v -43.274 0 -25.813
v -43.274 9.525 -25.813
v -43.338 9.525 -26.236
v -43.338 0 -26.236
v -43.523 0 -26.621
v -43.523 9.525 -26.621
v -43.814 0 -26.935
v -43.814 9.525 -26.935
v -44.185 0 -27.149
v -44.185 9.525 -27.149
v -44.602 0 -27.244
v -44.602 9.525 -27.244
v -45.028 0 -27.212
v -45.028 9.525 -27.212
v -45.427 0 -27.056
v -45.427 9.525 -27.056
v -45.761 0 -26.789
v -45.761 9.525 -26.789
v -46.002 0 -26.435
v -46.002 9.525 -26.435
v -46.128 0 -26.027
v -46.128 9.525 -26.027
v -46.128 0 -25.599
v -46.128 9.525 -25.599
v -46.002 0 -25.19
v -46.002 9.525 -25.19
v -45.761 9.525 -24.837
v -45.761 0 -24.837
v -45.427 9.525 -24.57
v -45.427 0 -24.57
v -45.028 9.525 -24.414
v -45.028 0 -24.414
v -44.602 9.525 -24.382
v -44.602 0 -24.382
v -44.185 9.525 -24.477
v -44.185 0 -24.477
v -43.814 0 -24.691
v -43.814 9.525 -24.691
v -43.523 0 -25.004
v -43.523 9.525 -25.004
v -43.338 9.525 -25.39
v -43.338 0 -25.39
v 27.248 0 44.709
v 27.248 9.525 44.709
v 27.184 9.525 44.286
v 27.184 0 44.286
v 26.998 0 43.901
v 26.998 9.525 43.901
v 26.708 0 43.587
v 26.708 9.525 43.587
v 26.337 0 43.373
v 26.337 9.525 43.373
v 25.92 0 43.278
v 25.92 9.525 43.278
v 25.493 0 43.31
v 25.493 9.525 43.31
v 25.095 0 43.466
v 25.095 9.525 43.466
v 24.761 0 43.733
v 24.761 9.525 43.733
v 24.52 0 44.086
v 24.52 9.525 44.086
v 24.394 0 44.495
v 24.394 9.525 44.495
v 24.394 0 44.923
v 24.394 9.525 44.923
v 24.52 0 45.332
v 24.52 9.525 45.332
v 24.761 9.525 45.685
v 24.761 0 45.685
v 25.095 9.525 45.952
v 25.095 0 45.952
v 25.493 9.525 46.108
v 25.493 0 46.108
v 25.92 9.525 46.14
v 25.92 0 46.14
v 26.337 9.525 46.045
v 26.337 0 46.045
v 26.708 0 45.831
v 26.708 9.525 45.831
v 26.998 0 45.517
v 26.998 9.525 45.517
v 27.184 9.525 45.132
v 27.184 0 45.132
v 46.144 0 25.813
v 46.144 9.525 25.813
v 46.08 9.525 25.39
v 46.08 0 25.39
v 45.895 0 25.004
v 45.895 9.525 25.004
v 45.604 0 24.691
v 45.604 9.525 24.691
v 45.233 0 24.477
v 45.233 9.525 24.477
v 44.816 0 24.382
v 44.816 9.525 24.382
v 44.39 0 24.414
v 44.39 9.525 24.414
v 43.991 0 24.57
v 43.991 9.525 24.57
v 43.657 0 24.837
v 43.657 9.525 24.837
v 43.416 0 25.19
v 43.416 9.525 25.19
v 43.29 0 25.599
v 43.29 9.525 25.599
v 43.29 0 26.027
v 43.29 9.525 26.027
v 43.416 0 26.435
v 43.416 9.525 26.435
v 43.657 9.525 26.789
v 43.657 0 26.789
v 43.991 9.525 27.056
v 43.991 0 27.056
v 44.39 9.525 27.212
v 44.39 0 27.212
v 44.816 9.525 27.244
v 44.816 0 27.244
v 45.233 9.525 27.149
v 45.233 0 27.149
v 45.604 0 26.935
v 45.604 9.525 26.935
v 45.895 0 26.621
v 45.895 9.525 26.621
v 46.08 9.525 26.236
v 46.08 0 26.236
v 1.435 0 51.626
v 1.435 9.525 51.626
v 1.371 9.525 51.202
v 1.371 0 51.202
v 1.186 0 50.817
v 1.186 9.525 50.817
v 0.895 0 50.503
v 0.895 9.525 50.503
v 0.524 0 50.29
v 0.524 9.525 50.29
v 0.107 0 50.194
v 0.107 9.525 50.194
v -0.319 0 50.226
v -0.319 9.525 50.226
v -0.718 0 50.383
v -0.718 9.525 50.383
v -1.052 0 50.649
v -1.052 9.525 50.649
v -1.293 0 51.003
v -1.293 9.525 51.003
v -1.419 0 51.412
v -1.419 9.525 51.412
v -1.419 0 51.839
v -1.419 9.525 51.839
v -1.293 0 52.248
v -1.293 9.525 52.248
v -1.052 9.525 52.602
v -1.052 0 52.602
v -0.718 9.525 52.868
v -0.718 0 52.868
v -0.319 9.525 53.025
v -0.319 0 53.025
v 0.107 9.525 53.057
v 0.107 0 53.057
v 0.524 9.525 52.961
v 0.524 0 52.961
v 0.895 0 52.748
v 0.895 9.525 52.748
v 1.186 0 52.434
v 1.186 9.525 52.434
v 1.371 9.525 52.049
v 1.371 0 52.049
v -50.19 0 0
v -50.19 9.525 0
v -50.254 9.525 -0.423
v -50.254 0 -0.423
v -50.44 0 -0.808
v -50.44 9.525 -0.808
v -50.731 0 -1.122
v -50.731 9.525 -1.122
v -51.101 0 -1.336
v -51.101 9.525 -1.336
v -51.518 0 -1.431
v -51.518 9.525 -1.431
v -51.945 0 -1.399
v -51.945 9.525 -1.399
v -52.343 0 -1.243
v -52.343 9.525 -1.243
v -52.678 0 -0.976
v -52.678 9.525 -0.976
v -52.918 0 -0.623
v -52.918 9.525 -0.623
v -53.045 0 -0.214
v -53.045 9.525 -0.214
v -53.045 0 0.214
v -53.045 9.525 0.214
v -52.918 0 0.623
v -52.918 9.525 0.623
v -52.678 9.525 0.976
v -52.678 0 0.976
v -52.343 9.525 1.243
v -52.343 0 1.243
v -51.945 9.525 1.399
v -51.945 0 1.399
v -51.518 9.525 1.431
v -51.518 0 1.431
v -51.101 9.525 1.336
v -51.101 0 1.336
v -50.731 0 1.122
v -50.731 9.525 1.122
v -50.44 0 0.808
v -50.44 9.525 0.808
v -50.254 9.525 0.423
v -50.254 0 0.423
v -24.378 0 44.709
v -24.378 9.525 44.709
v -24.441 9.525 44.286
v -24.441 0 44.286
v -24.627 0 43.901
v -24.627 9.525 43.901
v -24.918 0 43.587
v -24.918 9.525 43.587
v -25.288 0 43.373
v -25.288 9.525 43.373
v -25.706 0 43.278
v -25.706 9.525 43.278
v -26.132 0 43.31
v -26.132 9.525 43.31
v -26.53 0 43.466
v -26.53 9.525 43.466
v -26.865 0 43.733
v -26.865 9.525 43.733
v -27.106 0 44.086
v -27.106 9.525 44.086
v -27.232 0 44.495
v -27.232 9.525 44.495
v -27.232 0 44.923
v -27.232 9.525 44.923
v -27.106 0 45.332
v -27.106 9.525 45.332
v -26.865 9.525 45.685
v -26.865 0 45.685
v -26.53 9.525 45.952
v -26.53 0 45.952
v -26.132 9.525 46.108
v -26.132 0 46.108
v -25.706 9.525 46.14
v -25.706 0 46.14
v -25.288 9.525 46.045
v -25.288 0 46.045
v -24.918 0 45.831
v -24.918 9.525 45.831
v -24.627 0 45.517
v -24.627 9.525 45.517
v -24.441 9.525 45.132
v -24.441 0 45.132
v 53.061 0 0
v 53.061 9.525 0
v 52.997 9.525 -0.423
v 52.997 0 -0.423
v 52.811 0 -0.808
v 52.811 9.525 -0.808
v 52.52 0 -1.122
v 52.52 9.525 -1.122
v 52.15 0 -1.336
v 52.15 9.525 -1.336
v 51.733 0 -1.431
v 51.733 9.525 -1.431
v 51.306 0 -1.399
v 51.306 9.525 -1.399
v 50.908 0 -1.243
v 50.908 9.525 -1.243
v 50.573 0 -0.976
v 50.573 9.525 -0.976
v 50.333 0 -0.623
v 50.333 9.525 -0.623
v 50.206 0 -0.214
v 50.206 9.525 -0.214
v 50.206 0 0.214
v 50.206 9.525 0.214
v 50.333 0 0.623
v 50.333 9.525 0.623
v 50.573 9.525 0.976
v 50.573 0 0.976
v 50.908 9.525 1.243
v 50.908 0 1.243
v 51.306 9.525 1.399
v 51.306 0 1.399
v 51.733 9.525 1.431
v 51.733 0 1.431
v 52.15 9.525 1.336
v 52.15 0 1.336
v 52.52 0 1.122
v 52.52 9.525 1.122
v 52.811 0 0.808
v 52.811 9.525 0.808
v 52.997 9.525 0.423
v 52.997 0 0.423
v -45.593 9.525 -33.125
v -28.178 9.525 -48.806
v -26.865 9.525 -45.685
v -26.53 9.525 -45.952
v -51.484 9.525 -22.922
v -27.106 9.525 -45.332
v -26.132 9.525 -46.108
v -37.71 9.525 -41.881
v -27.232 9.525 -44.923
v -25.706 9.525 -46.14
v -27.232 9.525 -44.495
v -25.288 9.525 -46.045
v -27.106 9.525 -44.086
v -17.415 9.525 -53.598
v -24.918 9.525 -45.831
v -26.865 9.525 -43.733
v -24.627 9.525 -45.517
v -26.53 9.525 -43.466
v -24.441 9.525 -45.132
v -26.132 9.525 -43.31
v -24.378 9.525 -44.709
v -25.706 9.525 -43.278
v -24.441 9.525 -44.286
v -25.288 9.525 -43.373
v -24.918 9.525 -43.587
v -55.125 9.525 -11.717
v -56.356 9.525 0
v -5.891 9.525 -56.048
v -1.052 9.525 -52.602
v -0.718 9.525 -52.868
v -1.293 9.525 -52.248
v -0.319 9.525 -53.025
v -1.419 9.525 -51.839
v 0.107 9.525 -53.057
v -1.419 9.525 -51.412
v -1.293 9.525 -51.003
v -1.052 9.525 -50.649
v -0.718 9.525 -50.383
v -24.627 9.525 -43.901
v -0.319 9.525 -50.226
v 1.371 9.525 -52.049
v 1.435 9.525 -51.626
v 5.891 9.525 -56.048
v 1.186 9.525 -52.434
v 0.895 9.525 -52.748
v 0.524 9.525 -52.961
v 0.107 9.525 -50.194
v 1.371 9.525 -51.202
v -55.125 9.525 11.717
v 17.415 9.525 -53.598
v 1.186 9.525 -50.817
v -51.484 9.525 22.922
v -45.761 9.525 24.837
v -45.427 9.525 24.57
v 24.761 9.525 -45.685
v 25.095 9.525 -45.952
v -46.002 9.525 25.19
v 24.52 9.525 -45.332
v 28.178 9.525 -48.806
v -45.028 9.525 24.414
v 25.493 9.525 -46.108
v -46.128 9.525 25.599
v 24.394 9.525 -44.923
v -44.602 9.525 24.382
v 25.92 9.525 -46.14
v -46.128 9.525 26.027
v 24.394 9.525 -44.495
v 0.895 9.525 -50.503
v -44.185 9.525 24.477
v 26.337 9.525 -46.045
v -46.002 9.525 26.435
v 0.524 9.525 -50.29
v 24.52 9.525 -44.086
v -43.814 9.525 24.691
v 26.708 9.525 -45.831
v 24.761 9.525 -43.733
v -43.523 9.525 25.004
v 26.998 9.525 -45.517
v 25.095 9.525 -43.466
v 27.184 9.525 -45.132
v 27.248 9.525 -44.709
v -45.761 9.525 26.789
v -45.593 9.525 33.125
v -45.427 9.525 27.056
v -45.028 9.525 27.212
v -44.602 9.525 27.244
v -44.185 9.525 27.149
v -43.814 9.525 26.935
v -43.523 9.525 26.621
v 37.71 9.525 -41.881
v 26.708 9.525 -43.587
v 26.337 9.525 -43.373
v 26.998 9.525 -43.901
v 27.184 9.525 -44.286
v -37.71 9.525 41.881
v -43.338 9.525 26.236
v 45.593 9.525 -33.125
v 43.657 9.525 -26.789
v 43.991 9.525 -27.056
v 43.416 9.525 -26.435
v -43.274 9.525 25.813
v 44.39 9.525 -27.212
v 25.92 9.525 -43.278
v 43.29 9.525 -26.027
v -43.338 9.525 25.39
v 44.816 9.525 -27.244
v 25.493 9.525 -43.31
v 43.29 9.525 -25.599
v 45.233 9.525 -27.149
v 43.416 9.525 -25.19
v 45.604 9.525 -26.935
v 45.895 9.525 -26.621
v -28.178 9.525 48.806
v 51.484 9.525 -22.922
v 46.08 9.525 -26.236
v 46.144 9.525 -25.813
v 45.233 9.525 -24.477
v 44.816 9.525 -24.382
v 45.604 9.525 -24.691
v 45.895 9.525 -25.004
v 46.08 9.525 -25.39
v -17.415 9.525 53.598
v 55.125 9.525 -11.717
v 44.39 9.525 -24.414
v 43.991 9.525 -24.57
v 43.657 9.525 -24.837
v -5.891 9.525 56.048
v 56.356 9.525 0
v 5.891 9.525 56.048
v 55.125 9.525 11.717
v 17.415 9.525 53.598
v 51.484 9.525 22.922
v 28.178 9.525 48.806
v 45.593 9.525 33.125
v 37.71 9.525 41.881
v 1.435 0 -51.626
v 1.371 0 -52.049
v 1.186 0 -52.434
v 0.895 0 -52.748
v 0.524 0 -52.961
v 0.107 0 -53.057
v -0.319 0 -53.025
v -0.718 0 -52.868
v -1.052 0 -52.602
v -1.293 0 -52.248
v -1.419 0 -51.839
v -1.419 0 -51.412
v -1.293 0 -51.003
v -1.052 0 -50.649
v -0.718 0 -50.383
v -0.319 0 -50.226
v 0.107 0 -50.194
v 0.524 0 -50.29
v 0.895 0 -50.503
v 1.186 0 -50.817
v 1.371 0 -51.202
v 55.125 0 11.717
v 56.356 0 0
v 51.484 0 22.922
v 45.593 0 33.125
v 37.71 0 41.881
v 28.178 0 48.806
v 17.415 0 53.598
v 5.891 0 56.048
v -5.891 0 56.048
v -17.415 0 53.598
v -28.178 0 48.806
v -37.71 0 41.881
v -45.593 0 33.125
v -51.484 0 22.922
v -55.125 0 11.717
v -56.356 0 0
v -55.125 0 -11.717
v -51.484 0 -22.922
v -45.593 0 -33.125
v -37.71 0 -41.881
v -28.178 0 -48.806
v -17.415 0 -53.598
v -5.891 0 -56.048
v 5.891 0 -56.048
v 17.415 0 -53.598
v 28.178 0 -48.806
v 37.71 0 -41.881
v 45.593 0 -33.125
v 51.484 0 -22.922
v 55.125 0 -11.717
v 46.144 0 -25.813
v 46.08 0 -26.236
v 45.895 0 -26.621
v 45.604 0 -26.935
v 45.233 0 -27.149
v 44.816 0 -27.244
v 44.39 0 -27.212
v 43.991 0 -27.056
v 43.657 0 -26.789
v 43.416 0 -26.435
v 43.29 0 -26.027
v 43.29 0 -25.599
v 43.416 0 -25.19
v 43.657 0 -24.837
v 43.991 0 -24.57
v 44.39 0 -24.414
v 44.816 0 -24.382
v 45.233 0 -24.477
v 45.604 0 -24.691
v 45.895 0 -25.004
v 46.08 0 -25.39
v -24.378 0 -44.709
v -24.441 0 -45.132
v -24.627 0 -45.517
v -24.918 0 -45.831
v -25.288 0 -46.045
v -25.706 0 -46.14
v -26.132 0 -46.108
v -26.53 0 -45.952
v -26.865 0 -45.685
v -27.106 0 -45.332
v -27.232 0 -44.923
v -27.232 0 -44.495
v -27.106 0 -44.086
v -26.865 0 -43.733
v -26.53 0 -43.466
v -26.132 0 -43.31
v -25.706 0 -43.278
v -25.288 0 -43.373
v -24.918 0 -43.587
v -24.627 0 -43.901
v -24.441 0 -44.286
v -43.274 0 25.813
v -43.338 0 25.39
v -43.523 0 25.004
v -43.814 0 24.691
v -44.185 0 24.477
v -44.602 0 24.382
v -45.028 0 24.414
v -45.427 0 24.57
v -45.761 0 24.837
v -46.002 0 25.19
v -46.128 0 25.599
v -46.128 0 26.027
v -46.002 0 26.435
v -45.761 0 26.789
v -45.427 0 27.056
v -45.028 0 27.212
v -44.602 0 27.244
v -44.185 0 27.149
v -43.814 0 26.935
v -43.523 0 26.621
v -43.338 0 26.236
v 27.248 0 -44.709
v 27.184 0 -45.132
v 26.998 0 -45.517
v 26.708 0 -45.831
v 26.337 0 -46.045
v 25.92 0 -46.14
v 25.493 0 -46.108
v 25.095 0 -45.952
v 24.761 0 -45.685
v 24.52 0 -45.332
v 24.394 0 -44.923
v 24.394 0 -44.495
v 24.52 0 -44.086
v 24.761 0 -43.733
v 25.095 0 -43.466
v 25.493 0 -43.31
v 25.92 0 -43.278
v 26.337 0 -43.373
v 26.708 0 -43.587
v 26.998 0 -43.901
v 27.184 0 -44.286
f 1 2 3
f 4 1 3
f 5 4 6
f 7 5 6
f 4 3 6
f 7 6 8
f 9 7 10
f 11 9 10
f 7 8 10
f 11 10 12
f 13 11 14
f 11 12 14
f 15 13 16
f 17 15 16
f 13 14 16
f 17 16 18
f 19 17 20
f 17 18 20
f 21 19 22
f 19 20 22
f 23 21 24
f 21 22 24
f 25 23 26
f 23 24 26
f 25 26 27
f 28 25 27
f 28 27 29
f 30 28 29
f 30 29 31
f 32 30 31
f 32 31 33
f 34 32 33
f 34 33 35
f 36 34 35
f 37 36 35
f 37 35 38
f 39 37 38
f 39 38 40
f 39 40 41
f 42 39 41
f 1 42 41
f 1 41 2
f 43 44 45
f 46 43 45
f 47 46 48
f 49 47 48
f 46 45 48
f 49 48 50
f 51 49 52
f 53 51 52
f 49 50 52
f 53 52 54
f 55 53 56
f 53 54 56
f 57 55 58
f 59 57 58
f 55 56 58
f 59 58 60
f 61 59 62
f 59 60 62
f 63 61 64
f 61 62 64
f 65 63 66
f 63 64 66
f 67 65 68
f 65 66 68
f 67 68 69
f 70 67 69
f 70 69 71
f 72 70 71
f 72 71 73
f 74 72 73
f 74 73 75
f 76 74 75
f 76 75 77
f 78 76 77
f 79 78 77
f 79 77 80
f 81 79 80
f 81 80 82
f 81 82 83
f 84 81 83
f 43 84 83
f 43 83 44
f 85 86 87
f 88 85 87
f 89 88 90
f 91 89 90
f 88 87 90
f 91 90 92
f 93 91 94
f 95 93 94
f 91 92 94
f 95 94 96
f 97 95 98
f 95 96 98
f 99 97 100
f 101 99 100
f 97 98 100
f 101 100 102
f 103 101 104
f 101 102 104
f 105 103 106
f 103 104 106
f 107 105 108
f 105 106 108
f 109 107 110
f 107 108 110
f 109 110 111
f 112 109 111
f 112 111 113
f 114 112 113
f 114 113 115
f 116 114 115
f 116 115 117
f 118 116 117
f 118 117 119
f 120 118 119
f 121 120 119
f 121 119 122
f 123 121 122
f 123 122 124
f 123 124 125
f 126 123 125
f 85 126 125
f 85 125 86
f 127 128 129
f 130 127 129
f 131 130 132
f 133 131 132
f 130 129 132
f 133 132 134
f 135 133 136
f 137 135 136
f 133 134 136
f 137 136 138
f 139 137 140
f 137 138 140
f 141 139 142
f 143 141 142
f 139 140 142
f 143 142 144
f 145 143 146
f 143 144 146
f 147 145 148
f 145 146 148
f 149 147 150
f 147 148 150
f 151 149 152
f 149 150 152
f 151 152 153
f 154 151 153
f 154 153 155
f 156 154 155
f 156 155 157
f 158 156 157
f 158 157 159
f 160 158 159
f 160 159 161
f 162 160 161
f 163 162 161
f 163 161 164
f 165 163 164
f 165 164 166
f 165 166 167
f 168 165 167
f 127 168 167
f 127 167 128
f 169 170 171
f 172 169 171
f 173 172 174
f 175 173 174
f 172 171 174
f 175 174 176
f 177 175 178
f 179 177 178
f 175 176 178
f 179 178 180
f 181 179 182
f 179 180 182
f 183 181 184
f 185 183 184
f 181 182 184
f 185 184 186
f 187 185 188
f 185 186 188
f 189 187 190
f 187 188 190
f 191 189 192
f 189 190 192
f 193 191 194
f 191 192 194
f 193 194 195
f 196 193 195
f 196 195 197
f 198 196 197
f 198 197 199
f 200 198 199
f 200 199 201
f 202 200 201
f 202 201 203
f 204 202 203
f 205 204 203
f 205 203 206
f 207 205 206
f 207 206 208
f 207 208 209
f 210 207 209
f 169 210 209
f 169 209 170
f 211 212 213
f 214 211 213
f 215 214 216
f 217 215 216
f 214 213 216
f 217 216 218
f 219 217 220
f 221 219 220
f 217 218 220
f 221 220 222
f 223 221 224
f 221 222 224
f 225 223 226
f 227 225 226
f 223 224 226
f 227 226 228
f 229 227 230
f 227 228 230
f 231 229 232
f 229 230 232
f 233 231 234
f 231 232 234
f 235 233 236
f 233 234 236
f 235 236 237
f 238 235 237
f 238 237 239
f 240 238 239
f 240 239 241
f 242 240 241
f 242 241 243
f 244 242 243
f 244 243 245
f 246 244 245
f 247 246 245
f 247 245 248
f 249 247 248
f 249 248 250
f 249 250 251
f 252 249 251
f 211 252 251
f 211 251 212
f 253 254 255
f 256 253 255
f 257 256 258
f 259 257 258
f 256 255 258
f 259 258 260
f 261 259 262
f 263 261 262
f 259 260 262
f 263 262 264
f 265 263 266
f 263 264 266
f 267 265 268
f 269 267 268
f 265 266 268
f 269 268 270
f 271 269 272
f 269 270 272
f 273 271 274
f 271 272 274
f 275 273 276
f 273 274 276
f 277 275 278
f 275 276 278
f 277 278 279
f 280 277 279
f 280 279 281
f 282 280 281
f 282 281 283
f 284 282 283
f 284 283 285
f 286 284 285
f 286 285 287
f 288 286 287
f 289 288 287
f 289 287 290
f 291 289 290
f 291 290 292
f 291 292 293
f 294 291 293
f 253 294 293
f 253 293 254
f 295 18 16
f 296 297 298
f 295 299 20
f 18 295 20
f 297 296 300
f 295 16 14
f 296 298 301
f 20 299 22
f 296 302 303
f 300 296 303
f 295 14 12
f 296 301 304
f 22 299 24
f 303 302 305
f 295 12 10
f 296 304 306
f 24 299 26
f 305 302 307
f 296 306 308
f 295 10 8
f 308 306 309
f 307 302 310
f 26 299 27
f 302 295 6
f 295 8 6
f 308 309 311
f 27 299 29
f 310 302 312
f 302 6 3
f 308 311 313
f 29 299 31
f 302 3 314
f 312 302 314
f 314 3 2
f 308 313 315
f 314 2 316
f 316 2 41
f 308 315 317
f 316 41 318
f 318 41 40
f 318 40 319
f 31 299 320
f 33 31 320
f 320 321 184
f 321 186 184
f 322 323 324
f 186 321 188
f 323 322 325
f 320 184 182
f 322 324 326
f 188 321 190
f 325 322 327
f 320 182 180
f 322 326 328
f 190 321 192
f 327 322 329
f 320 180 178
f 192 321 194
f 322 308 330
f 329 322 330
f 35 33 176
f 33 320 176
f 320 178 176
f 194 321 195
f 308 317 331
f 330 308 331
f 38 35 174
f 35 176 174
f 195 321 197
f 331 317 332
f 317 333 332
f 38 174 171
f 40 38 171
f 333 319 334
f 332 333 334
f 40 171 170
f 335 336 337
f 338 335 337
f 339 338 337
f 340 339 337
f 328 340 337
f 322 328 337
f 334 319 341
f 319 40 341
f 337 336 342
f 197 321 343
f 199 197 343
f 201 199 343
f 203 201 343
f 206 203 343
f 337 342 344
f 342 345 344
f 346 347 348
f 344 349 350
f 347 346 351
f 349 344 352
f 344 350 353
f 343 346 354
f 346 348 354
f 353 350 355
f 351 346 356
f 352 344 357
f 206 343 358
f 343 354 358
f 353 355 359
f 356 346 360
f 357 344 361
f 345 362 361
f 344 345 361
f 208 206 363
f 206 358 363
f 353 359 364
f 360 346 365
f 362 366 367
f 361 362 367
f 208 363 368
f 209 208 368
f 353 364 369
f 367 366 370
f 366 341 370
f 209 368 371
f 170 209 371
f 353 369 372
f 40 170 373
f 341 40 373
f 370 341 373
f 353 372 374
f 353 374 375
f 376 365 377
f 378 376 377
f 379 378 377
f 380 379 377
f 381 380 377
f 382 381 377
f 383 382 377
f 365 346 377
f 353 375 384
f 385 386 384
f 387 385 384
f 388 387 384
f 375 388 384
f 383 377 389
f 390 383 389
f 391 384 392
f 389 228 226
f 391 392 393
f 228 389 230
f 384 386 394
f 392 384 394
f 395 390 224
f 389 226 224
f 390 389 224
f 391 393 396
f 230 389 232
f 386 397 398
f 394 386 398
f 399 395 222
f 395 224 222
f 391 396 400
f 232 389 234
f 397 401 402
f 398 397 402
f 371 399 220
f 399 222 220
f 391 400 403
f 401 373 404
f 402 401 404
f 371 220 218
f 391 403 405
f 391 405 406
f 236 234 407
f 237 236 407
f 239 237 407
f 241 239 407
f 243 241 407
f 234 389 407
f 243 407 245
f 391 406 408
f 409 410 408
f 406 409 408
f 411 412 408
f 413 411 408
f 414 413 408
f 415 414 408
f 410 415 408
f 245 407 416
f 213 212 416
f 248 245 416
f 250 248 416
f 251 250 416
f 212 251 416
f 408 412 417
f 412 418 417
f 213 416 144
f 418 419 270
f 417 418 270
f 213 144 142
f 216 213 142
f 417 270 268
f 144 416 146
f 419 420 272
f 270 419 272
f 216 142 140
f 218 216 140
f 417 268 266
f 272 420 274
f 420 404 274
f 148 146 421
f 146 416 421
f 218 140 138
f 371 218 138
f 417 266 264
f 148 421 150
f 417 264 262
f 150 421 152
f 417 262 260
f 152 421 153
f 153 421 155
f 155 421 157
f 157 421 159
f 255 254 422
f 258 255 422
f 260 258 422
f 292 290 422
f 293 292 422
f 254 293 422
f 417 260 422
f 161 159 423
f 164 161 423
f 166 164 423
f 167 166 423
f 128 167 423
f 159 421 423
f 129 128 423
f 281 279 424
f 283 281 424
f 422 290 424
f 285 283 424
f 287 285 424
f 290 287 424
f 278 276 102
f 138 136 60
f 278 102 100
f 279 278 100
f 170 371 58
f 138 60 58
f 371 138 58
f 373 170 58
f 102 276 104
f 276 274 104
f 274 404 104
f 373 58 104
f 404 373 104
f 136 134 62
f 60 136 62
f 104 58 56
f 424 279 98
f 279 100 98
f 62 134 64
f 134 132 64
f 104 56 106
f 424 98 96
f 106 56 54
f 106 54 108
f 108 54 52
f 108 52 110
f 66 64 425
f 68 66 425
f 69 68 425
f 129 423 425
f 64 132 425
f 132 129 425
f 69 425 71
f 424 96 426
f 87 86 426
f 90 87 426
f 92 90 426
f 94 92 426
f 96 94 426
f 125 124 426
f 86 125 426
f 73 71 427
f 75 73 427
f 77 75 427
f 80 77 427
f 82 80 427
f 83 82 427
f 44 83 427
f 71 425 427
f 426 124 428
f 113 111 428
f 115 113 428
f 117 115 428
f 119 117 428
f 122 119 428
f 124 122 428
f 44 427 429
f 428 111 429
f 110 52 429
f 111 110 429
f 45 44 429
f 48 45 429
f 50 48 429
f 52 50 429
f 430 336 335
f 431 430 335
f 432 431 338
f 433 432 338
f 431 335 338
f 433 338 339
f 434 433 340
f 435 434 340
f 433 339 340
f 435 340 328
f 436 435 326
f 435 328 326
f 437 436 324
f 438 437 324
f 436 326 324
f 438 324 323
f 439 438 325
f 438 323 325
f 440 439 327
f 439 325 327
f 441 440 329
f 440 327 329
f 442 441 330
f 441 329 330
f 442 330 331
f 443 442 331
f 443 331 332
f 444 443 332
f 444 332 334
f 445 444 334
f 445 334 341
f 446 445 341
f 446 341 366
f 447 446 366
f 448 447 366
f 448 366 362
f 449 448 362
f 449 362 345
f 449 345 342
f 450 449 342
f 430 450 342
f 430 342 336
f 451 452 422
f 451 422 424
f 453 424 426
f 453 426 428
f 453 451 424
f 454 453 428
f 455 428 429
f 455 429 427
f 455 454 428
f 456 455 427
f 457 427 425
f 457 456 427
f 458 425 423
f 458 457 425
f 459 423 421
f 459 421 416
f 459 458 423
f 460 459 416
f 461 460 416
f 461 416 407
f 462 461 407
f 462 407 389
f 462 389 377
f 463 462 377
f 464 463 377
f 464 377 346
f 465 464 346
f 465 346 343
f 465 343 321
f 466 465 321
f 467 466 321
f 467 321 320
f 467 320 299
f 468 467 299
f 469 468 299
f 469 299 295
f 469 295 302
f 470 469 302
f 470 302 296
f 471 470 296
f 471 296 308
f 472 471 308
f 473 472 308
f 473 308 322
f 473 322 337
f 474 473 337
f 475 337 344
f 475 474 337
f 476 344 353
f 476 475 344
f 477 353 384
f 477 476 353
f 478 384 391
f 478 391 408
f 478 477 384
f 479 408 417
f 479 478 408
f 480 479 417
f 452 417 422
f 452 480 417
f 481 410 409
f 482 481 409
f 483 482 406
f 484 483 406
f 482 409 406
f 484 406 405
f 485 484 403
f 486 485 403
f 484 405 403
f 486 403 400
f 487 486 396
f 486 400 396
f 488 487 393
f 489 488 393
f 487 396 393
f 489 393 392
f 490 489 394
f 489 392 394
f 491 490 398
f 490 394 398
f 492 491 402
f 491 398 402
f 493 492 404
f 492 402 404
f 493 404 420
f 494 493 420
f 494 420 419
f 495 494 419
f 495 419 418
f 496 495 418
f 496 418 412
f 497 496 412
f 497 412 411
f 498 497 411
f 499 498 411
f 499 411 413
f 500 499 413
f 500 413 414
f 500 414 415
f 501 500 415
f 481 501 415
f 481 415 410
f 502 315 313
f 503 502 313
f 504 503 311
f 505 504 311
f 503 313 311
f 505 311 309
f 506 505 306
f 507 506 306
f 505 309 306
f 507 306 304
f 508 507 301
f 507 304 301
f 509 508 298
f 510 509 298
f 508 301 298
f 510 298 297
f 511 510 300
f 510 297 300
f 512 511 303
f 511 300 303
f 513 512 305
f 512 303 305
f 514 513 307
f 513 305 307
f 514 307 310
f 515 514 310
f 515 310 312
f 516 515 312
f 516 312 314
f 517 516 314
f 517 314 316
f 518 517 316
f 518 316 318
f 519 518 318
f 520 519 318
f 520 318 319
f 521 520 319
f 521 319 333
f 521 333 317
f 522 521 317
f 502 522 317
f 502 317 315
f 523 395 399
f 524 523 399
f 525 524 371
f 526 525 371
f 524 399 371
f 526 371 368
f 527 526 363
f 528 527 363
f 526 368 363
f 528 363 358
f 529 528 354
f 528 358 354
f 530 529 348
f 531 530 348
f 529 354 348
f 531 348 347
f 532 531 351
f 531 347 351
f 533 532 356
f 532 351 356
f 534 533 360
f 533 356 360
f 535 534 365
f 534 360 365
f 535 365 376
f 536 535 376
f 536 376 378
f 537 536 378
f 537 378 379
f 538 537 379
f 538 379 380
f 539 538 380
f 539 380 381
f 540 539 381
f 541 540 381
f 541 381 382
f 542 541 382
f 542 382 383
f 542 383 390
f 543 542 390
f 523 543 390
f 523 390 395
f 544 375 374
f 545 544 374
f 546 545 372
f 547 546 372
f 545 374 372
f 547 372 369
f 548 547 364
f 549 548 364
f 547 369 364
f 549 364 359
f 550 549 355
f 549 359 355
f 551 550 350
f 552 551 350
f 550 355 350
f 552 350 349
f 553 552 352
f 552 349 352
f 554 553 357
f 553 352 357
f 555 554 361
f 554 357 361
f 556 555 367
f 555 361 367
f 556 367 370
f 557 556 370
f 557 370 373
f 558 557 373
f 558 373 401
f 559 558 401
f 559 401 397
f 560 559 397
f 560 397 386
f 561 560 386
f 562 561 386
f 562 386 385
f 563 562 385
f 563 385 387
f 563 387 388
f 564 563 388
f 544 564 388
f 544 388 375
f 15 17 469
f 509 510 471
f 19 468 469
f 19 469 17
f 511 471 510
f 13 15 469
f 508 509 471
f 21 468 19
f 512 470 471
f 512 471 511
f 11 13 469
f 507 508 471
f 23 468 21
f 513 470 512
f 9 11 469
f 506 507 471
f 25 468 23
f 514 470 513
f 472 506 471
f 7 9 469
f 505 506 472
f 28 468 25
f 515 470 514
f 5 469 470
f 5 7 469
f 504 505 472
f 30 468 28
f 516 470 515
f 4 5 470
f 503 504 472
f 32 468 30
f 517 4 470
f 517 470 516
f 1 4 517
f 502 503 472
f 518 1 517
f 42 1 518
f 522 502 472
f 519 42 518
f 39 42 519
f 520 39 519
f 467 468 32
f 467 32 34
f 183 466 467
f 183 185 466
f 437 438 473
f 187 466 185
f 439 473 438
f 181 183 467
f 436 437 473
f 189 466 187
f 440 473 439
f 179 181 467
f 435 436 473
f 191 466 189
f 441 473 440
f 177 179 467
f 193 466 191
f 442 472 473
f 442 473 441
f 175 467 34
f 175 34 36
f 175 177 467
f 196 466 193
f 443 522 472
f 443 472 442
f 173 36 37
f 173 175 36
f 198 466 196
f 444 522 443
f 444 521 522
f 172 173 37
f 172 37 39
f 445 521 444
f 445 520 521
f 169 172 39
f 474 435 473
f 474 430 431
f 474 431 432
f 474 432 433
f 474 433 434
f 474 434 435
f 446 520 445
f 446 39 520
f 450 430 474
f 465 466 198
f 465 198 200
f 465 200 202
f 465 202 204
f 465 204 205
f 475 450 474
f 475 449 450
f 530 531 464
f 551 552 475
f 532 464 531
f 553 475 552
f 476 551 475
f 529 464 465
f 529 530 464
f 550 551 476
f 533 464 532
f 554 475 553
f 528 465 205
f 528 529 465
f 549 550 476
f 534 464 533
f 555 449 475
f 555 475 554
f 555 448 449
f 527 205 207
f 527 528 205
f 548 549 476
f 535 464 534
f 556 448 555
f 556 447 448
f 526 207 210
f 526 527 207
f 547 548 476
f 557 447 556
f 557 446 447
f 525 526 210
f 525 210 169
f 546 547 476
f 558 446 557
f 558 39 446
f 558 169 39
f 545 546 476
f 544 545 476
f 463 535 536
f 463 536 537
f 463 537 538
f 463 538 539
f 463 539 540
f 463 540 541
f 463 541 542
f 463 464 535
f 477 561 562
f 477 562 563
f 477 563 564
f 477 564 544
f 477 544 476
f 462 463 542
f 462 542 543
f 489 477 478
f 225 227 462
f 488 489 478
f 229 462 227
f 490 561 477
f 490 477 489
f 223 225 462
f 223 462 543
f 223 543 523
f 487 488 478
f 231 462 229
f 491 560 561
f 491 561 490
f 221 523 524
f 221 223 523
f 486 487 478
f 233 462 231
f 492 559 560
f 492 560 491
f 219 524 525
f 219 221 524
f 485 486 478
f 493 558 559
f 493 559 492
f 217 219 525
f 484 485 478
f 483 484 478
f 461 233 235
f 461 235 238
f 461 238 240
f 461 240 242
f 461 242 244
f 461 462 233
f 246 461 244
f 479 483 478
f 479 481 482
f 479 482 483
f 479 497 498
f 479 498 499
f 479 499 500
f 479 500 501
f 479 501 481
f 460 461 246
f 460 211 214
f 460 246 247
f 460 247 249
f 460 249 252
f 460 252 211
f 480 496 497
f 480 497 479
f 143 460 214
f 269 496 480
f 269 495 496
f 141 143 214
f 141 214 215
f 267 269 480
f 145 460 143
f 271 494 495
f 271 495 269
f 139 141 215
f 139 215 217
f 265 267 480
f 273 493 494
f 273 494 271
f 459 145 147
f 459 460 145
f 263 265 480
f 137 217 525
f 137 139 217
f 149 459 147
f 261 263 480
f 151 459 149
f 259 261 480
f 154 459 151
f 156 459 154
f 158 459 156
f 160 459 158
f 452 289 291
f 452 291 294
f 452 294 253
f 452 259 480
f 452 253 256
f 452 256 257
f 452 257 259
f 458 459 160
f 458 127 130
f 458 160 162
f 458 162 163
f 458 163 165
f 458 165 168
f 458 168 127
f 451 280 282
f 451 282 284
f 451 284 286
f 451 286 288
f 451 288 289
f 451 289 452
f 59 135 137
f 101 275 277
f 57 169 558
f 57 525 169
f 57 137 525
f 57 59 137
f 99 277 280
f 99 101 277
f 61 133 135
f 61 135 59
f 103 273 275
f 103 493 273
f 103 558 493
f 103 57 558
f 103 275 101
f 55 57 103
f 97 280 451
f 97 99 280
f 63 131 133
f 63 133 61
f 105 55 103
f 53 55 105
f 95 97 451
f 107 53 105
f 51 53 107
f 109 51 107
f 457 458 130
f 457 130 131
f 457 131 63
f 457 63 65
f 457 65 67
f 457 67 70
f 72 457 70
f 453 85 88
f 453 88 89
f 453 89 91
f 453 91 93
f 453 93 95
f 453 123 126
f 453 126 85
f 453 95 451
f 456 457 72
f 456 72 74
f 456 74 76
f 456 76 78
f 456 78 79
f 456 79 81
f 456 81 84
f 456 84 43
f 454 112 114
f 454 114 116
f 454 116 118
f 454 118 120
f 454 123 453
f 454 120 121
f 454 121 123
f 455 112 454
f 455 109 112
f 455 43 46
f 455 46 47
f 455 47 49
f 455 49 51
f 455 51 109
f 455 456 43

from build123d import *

# Parameters (mm, degrees)
SKETCH2_R           = 25.4
BASE_CYLINDER_DEPTH = 19.05
SKETCH3_R           = 56.35625
AFT_FLANGE_DEPTH    = 9.525
BOLT_CIRCLE_D       = 2.8702
BOLT_CIRCLE_DEPTH   = 9.525
SKETCH20_W          = 71.924294246
SKETCH20_H          = 16.463903039
CUT_EXTRUDE2_DEPTH  = 152.4


with BuildPart() as part:
    # Sketch2 → Base Cylinder (new body)
    with BuildSketch(Plane(origin=(0, 0, 0), x_dir=(1, 0, 0), z_dir=(0, 1, 0))):
        Circle(SKETCH2_R)
    extrude(amount=BASE_CYLINDER_DEPTH)

    # Sketch3 → Aft Flange (add)
    with BuildSketch(Plane.XZ):
        Circle(SKETCH3_R)
    extrude(amount=-AFT_FLANGE_DEPTH)

    # Bolt Circle
    with Locations(Plane(origin=(0, 0, 0), x_dir=(-1, 0, 0), z_dir=(0, -1, 0))):
        with Locations((-25.81275, -44.708994483), (-44.708994483, -25.81275), (-51.6255, 0), (-44.708994483, 25.81275), (-25.81275, 44.708994483), (0, 51.6255), (25.81275, 44.708994483), (44.708994483, 25.81275), (51.6255, 0), (44.708994483, -25.81275), (25.81275, -44.708994483), (0, -51.6255)):
            Hole(BOLT_CIRCLE_D / 2, depth=BOLT_CIRCLE_DEPTH)

    # Sketch20 → Cut-Extrude2 (cut, symmetric)
    with BuildSketch(Plane.XY):
        with Locations((-3.698234988, 17.756951519)):
            Rectangle(SKETCH20_W, SKETCH20_H)
    extrude(amount=CUT_EXTRUDE2_DEPTH, both=True, mode=Mode.SUBTRACT)


solid = part.part
